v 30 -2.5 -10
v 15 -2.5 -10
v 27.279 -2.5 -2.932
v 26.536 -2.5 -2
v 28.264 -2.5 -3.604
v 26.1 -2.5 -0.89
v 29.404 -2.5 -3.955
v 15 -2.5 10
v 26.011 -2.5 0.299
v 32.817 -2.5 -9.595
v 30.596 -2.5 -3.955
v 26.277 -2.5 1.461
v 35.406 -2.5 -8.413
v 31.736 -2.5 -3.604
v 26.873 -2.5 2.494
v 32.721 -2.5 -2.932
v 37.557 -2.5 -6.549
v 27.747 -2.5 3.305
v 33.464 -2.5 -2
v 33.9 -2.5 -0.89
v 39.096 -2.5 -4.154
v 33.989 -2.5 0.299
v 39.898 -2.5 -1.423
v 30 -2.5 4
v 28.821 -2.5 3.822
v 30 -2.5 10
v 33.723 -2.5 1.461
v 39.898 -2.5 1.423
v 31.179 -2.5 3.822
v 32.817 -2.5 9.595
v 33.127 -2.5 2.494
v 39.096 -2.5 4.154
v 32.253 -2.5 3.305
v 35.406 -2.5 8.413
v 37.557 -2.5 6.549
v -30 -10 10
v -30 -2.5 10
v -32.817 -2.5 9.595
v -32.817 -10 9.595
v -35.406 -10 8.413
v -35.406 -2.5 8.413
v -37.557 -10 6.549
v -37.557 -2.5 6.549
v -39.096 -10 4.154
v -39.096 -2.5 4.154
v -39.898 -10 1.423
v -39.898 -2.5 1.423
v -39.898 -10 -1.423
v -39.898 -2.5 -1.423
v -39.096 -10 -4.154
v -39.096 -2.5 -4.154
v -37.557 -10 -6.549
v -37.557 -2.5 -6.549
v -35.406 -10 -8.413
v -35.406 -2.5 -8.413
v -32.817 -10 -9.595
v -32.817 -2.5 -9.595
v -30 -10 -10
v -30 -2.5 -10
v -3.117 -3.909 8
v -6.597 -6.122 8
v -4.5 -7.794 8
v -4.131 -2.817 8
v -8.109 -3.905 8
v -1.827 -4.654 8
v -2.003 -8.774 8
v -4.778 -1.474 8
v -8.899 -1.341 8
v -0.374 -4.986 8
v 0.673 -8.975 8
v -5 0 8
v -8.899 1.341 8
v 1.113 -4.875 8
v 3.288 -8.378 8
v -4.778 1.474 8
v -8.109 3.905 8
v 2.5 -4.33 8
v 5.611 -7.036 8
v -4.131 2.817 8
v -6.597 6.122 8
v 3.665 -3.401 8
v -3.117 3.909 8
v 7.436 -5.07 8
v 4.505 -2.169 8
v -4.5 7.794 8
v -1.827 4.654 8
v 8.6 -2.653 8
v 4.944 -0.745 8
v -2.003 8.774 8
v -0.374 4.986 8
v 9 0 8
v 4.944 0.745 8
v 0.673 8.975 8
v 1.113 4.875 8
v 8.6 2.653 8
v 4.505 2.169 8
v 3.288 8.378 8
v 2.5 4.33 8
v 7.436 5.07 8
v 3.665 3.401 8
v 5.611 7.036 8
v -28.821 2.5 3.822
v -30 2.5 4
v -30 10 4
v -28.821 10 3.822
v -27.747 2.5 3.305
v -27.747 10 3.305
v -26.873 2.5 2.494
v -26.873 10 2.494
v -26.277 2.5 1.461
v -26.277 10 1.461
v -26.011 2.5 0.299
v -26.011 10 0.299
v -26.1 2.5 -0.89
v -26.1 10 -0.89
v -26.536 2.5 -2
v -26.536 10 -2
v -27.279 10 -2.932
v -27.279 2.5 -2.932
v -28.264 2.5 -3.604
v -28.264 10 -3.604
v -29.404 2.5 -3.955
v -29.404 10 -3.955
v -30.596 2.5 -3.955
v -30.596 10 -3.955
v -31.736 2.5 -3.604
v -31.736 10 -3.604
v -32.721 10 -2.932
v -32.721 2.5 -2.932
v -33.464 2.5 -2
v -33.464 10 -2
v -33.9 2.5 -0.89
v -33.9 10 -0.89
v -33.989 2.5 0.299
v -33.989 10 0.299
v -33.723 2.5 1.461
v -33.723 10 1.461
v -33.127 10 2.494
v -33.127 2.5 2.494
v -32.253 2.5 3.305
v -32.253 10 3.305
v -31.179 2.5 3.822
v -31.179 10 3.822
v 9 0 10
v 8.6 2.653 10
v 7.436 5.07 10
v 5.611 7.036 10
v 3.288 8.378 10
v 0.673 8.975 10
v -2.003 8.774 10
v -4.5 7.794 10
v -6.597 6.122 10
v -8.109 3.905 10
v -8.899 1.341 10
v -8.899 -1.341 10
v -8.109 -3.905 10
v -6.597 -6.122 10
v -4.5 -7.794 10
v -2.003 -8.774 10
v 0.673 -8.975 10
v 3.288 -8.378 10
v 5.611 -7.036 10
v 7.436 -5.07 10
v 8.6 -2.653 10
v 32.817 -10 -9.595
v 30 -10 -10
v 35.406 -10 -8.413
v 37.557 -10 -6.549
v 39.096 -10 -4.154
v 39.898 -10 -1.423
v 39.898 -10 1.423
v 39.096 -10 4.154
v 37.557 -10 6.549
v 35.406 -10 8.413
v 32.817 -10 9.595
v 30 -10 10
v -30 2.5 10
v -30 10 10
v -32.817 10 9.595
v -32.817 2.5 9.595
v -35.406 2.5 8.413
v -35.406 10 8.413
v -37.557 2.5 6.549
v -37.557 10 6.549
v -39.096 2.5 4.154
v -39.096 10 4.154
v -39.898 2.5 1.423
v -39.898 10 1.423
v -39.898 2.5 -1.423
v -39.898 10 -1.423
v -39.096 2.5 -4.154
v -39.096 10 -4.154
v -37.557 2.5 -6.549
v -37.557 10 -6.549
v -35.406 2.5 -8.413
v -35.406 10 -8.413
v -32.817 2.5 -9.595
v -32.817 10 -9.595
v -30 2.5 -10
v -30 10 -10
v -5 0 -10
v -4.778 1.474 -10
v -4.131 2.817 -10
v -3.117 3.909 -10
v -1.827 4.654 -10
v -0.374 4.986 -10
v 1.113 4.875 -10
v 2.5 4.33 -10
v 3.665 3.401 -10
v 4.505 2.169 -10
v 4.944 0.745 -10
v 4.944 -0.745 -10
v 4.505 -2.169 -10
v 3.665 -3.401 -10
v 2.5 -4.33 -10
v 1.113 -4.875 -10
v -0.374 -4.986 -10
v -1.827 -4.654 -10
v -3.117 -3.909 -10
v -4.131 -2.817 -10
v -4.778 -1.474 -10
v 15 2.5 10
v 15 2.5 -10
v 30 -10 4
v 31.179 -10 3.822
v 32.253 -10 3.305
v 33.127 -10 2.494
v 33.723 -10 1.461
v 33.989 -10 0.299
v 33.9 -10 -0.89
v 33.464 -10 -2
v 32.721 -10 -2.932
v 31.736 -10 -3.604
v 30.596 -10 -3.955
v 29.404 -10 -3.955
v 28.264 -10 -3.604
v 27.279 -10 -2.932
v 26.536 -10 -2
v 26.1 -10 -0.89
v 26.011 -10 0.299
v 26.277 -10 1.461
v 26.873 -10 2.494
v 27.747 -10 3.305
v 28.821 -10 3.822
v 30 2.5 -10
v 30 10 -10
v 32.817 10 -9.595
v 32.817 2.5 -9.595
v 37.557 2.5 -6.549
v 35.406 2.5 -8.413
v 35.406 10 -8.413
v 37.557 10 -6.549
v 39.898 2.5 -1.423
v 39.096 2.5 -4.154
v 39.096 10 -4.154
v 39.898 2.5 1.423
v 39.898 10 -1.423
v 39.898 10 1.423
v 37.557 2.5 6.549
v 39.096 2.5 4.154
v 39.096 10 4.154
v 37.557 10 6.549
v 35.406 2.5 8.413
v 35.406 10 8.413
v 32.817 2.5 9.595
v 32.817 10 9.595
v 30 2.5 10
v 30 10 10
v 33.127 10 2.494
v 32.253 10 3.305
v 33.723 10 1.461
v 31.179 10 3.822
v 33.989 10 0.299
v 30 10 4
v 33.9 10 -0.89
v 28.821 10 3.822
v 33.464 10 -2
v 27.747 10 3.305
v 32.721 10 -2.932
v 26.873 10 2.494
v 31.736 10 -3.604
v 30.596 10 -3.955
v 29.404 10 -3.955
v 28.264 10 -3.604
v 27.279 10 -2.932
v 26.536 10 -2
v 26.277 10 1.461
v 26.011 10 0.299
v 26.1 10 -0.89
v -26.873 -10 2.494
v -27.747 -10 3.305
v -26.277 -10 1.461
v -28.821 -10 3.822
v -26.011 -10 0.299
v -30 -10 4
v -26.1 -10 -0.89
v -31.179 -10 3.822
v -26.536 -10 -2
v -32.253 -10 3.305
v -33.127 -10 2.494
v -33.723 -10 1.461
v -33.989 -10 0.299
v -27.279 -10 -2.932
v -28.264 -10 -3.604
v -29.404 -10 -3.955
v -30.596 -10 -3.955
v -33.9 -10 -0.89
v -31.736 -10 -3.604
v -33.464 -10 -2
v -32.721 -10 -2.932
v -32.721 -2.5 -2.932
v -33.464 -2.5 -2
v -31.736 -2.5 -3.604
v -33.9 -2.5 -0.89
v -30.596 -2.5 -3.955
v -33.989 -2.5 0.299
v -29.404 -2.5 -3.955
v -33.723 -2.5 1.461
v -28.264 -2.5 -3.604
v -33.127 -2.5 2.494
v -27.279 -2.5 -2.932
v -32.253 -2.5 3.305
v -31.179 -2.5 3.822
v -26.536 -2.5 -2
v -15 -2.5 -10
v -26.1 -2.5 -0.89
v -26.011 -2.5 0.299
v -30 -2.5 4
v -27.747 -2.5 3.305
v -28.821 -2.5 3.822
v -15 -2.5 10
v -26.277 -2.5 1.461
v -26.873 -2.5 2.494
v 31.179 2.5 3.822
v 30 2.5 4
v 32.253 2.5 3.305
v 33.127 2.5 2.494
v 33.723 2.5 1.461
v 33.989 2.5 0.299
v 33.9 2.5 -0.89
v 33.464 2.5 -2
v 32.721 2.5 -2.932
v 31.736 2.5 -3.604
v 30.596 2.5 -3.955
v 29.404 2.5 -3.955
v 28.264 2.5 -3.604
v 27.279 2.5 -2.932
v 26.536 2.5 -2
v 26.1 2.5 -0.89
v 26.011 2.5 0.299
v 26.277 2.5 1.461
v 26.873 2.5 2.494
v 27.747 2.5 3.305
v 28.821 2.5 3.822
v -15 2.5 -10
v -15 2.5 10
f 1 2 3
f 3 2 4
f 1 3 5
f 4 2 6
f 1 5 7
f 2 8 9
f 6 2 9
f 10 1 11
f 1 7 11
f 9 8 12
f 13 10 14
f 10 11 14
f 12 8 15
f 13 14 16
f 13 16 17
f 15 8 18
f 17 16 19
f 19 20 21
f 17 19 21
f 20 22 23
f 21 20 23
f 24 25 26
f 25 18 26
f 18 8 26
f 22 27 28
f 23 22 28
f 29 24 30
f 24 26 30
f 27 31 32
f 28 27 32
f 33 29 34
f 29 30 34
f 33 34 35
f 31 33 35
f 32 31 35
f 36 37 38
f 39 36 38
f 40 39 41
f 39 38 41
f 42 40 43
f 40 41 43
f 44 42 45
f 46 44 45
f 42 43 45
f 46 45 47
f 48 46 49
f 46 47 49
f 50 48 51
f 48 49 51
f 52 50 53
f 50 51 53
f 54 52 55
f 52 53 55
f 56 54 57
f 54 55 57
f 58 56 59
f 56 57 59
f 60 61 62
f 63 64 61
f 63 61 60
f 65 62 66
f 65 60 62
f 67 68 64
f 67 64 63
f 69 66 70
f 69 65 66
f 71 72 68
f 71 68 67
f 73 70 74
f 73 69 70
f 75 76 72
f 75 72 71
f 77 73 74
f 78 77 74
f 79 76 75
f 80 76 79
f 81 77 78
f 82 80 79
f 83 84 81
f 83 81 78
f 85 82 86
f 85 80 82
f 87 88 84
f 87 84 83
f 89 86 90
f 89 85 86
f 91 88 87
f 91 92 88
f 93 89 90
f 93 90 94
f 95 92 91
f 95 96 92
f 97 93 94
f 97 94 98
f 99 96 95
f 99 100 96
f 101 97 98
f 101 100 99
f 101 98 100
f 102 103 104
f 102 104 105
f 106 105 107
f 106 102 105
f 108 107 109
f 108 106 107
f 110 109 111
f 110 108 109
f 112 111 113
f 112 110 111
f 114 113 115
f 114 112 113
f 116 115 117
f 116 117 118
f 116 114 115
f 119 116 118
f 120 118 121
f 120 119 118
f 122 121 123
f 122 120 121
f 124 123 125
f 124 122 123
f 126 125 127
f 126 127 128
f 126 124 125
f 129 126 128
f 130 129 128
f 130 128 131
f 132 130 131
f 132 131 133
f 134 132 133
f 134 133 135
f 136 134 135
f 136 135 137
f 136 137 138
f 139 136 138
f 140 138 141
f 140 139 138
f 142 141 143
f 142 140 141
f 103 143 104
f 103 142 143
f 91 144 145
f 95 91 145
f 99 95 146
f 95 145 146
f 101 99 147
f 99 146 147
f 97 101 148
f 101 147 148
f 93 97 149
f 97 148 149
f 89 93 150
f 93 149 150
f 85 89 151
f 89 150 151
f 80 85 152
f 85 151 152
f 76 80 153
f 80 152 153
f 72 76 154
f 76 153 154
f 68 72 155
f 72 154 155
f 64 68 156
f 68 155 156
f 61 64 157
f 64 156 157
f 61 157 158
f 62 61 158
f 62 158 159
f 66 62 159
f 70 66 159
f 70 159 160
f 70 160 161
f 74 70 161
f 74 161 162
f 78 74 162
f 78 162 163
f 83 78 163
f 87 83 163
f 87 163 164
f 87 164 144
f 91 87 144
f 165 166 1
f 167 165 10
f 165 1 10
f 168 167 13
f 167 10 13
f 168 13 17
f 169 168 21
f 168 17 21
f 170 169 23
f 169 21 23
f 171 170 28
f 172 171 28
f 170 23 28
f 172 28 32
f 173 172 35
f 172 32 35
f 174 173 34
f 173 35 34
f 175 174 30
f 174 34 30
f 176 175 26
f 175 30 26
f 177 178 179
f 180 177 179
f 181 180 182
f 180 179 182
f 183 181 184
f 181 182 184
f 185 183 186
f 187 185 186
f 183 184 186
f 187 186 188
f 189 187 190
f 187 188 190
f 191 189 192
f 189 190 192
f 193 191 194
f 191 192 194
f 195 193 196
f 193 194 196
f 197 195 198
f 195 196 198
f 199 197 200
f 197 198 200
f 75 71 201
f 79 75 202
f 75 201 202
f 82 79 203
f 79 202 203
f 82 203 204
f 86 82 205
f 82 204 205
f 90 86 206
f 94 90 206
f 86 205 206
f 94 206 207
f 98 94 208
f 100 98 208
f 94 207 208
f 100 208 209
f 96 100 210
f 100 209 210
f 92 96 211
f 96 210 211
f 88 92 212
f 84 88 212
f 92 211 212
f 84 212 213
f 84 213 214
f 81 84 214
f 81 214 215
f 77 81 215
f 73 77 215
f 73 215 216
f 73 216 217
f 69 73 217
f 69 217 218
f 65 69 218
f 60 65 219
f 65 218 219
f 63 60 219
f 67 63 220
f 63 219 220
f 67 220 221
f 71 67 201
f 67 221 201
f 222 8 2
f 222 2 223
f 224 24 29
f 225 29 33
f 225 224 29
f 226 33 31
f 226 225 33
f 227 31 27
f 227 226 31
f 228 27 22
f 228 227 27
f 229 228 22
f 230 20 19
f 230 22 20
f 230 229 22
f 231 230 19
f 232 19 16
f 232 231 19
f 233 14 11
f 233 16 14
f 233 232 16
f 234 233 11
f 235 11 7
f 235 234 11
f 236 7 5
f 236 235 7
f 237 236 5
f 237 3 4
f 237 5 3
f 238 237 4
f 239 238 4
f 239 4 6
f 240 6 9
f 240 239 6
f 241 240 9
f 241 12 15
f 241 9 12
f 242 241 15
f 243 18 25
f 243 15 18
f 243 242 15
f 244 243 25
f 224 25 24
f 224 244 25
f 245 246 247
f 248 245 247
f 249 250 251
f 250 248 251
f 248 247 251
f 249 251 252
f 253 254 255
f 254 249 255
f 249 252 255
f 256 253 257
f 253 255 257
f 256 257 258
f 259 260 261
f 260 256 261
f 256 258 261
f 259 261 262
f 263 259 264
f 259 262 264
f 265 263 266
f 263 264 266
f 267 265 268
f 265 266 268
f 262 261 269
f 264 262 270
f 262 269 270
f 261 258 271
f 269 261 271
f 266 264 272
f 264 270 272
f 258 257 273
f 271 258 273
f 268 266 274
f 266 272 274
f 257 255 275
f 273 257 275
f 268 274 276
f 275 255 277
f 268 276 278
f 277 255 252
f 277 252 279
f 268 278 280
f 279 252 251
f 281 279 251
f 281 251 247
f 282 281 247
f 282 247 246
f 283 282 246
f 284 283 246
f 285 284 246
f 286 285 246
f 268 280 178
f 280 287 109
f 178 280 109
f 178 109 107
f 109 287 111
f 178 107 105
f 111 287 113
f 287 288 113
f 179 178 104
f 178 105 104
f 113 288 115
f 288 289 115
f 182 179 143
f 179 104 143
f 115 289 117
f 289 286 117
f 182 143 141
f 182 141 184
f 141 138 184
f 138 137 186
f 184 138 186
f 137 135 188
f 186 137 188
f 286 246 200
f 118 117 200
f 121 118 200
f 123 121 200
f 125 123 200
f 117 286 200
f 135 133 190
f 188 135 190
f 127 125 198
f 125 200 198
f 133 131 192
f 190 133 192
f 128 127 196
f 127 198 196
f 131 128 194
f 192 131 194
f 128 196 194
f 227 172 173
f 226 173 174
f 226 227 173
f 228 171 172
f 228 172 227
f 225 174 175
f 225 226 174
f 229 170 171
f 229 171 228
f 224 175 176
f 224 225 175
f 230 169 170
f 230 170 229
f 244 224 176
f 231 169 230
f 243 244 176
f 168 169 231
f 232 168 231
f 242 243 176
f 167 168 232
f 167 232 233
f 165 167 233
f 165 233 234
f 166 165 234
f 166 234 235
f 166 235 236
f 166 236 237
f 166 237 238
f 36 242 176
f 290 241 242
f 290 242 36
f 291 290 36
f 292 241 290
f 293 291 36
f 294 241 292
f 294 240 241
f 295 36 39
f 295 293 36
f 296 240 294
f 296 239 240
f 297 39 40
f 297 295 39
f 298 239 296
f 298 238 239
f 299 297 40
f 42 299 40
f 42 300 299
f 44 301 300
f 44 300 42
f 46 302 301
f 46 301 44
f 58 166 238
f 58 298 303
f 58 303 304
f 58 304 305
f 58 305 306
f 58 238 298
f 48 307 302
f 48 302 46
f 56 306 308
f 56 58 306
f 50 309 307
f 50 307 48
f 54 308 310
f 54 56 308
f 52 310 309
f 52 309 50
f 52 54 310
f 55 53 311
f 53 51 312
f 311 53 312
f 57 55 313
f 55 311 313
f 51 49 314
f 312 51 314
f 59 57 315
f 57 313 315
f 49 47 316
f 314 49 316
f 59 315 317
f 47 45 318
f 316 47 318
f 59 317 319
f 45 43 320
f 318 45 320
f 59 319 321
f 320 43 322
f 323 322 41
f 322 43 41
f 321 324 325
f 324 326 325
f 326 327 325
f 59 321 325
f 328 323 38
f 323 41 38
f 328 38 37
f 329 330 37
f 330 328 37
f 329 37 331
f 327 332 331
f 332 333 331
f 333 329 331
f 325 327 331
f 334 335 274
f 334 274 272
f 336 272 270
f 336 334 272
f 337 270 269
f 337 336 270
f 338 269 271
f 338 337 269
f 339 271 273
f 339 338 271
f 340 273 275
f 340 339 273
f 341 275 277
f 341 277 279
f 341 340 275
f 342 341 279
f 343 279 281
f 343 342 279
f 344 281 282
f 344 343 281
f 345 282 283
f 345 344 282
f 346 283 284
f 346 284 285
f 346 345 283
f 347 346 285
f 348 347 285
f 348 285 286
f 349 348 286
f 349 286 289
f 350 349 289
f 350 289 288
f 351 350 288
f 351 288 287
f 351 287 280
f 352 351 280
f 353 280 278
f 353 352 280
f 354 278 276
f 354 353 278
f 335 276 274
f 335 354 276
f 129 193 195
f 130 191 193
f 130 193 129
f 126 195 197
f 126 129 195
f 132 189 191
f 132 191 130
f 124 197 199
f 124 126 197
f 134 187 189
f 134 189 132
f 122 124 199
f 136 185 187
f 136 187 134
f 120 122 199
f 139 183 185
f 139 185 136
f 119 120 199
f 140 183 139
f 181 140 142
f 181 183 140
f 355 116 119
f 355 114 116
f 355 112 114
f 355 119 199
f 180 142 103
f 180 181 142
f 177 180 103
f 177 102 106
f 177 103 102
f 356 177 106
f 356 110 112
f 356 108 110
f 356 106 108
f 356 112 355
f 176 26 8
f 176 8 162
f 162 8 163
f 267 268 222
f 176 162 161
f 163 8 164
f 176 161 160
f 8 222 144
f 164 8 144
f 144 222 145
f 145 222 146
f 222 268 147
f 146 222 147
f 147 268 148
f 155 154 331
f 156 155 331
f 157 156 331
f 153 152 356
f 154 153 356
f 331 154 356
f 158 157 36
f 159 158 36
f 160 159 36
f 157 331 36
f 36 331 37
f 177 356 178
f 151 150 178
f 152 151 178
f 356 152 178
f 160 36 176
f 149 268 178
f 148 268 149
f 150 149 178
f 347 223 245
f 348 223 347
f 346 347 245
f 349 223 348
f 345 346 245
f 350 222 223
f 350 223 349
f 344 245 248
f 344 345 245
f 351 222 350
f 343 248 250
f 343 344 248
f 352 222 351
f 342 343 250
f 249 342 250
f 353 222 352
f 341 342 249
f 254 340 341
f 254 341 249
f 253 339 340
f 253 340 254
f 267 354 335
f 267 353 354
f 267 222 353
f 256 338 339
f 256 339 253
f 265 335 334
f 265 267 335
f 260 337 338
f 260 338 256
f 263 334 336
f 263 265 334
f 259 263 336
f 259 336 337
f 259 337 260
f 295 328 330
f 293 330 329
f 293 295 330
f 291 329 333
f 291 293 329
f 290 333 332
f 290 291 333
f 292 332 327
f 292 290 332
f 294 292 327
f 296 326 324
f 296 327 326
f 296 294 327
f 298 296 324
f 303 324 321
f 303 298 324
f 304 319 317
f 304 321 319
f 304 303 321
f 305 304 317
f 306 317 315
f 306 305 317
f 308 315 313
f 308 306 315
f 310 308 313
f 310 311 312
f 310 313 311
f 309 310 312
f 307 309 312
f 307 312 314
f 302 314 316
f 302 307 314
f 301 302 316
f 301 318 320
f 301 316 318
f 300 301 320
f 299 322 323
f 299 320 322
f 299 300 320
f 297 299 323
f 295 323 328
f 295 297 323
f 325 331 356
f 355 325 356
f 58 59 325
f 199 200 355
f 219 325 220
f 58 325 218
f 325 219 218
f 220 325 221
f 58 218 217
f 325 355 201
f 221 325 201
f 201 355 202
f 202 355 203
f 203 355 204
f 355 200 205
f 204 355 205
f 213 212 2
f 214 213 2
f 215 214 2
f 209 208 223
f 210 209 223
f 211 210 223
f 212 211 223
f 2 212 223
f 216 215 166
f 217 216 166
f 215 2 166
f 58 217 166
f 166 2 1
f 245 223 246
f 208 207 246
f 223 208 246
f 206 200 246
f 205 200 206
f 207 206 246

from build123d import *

# Parameters (mm, degrees)
SKETCH1_R           = 4
BOSS_EXTRUDE1_DEPTH = 10
SKETCH3_W           = 25
SKETCH3_H           = 5
CUT_EXTRUDE1_DEPTH  = 46.82575695
HOLE1_D             = 10
HOLE1_CBORE_D       = 18
HOLE1_CBORE_DEPTH   = 2


with BuildPart() as part:
    # Sketch1 → Boss-Extrude1 (new, symmetric)
    with BuildSketch(Plane(origin=(0, 0, 0), x_dir=(1, 0, 0), z_dir=(0, 1, 0))):
        with BuildLine():
            Line((-30, 10), (30, 10))
            ThreePointArc((30, 10), (40, 0), (30, -10))
            Line((30, -10), (-30, -10))
            ThreePointArc((-30, -10), (-40, 0), (-30, 10))
        make_face()
        with Locations(Location((-30, 0, 0), (0, 0, 270))):
            Circle(SKETCH1_R, mode=Mode.SUBTRACT)
        with Locations(Location((30, 0, 0), (0, 0, 270))):
            Circle(SKETCH1_R, mode=Mode.SUBTRACT)
    extrude(amount=BOSS_EXTRUDE1_DEPTH, both=True)

    # Sketch3 → Cut-Extrude1 (cut, through all)
    with BuildSketch(Plane.XY.offset(10)):
        with Locations((27.5, 0)):
            Rectangle(SKETCH3_W, SKETCH3_H)
        with Locations((-27.5, 0)):
            Rectangle(SKETCH3_W, SKETCH3_H)
    extrude(amount=-CUT_EXTRUDE1_DEPTH, mode=Mode.SUBTRACT)

    # Hole1 (through all)
    with Locations(Plane.XY.offset(10)):
        with Locations((0, 0)):
            CounterBoreHole(HOLE1_D / 2, HOLE1_CBORE_D / 2, HOLE1_CBORE_DEPTH)


solid = part.part
